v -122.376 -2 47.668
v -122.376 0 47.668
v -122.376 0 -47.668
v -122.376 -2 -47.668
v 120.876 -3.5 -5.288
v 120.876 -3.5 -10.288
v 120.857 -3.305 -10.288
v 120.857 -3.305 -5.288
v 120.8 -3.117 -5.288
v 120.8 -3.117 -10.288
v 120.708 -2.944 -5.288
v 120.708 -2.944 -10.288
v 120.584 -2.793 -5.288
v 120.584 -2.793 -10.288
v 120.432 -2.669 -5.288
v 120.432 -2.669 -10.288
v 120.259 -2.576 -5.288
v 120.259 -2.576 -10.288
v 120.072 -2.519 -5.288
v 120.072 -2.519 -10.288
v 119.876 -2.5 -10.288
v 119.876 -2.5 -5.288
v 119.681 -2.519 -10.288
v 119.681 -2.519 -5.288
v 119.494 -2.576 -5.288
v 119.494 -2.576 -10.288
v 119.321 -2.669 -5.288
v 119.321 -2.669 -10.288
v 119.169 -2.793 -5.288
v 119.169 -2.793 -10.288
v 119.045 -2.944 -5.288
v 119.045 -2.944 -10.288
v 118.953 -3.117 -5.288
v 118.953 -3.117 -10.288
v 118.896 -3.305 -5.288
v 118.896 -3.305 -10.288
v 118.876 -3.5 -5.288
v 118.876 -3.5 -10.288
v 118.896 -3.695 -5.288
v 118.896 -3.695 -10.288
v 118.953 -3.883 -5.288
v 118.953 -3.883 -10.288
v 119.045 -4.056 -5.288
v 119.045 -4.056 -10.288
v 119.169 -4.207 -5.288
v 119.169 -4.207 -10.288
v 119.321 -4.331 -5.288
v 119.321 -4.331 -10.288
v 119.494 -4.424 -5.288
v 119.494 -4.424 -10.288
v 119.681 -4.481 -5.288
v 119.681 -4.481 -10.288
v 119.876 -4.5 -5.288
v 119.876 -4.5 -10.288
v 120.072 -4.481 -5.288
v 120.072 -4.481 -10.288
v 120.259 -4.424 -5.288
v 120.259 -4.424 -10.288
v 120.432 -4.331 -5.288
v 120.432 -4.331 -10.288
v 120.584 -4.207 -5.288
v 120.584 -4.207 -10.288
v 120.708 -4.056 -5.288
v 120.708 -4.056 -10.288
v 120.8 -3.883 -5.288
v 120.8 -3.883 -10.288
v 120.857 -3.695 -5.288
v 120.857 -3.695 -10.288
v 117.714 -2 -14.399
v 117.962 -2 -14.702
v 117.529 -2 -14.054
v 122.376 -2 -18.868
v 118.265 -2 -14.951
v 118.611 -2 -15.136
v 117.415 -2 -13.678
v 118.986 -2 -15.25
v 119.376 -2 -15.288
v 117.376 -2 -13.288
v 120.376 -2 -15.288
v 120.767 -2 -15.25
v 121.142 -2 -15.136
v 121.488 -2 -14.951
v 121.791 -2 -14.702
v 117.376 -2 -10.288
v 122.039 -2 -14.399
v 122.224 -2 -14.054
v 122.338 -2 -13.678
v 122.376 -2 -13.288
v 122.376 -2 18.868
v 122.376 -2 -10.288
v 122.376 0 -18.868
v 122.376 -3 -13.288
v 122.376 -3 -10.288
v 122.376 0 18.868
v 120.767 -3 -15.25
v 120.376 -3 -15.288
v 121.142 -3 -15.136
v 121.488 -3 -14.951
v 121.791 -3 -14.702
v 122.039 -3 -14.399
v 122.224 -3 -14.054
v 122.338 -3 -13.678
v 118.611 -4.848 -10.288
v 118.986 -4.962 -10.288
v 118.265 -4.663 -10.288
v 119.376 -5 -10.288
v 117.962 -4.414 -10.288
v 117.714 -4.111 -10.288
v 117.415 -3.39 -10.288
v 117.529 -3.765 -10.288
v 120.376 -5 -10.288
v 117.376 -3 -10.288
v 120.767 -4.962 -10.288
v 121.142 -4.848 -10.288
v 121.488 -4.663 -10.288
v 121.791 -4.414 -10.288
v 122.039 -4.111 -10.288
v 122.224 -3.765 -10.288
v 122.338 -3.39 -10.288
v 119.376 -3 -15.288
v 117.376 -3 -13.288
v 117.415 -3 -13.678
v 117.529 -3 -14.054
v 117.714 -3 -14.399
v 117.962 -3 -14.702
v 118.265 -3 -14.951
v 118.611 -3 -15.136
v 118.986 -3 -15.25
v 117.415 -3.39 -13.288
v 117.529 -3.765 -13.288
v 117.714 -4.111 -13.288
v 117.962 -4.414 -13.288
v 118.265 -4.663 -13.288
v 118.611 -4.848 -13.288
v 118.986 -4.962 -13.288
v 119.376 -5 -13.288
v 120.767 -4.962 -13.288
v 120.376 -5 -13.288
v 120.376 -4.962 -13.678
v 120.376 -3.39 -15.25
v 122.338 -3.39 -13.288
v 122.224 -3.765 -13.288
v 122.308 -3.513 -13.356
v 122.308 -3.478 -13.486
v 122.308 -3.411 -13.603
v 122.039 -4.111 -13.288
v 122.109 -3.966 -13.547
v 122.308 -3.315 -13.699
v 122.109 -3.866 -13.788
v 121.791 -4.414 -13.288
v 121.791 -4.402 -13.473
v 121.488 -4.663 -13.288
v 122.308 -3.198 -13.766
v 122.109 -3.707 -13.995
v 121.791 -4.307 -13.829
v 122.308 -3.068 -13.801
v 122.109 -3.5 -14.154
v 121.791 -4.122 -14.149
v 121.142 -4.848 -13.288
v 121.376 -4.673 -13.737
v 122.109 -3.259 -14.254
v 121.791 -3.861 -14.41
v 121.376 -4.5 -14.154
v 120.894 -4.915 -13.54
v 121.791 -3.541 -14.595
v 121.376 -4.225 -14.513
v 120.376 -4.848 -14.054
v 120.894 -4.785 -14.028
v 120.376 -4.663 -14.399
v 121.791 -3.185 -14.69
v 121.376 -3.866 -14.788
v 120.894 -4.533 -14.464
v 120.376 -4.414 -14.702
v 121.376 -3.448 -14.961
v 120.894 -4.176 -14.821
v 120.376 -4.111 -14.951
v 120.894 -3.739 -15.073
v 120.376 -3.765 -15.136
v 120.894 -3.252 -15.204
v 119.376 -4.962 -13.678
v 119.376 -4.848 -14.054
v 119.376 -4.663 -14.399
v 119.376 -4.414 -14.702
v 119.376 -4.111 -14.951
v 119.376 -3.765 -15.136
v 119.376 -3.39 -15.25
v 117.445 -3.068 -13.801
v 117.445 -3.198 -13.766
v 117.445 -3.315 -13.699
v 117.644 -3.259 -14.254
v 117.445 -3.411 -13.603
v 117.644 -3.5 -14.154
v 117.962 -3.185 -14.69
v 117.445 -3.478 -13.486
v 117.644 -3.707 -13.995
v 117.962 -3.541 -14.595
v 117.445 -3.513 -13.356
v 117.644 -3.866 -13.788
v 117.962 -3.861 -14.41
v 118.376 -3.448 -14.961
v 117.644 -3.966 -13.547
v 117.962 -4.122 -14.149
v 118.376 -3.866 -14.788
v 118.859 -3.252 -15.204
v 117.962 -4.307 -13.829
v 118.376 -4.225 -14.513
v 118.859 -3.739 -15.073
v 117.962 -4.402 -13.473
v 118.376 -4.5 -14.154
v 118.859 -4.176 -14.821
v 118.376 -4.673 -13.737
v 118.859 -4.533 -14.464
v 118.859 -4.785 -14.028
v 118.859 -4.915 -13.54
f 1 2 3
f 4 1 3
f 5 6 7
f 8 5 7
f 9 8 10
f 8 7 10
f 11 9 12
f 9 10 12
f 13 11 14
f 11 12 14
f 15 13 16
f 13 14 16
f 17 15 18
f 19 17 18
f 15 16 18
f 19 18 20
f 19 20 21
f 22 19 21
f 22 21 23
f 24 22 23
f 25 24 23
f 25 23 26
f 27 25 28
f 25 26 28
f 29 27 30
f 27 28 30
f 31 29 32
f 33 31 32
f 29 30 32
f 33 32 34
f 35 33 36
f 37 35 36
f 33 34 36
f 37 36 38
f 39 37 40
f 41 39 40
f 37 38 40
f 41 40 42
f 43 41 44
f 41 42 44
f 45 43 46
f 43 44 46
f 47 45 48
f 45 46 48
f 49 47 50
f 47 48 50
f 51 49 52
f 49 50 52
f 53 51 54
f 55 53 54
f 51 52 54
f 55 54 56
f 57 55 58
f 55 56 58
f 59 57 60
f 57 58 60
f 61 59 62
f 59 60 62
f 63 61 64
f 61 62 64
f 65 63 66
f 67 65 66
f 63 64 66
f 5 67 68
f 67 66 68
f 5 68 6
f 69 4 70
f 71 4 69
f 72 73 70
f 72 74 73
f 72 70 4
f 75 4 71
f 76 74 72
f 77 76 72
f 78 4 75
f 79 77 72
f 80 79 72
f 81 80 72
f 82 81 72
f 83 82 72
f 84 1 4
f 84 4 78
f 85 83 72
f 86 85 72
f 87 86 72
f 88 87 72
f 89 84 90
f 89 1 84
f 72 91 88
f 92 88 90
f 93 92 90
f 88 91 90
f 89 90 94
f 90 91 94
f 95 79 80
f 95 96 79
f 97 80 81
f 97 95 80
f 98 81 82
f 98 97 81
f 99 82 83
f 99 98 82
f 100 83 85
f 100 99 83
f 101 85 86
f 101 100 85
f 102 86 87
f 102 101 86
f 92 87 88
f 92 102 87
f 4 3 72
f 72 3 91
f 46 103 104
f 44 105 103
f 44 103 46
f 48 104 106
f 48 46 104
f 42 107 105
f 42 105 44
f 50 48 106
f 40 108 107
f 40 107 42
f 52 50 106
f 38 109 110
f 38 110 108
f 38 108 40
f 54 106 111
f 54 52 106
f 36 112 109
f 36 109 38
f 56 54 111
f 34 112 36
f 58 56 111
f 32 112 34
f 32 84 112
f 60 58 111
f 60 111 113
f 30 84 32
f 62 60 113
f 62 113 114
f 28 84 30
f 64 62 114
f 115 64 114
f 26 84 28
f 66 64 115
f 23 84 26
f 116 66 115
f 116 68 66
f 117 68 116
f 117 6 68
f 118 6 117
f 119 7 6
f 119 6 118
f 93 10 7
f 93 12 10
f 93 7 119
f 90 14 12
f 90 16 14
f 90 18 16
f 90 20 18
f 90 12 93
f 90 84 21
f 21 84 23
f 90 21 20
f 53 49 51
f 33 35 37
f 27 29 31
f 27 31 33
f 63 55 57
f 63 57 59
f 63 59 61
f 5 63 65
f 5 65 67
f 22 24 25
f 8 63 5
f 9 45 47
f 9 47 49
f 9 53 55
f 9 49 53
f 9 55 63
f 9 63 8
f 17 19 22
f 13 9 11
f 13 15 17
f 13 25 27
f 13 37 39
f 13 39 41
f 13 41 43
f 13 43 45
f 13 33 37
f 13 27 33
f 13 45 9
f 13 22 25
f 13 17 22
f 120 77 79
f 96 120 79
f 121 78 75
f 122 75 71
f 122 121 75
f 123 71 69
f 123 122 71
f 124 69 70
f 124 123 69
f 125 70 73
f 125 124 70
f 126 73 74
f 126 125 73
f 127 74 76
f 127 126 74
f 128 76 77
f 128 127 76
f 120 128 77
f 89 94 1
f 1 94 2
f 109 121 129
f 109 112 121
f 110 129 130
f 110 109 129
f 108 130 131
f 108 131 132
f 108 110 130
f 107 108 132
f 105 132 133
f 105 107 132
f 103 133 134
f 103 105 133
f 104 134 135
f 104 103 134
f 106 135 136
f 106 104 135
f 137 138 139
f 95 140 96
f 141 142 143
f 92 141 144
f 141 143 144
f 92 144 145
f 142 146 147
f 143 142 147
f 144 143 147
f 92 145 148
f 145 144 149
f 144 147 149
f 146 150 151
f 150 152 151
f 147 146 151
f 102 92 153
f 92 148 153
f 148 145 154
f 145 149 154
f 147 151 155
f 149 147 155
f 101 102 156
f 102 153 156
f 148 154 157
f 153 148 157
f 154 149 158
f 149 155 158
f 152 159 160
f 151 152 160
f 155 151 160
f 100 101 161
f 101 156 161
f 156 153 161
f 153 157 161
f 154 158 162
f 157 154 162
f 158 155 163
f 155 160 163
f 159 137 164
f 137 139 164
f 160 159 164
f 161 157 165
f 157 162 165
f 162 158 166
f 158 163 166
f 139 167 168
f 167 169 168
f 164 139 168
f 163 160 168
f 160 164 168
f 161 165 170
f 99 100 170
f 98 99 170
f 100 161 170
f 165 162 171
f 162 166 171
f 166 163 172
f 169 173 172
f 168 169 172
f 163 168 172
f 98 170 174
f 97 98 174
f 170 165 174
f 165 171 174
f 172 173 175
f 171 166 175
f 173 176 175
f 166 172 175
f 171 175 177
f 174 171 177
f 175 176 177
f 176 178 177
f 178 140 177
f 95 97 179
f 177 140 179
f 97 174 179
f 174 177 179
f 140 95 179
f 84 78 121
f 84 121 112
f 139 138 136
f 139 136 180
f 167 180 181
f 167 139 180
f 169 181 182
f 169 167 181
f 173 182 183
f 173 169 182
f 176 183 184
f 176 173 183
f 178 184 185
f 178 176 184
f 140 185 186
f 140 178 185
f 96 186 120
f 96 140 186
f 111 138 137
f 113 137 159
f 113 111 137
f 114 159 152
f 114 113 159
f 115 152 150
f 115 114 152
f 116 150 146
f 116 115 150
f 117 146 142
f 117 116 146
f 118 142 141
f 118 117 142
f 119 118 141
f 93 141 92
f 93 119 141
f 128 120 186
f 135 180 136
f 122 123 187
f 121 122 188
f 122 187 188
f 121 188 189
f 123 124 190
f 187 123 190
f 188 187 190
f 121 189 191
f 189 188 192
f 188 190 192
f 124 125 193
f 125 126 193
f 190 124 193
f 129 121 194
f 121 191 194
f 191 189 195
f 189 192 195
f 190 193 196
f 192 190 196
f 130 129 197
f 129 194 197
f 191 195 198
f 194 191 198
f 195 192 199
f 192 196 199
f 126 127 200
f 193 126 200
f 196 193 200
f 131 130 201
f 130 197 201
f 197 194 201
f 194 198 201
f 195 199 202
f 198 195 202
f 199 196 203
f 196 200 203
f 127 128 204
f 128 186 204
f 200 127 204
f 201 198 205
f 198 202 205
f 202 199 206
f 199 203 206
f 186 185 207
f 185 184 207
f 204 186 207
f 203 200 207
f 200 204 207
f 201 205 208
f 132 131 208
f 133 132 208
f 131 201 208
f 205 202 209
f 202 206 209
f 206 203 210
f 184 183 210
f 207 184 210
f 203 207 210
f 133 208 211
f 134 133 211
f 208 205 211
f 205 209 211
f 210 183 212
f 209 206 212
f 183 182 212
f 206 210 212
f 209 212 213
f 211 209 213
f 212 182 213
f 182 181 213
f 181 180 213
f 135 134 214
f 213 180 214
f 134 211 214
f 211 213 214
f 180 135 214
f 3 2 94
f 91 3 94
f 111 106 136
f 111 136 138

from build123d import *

# Parameters (mm, degrees)
F1_DEPTH = 2
F0_W     = 5
F0_H     = 5
F2_DEPTH = 5
F3_R     = 1
F4_DEPTH = 5
F5_R     = 2


with BuildPart() as f1:
    # F0 (on Front) → F1 (new body)
    with BuildSketch(Plane.XZ):
        Polygon((122.376468, -10.288223), (122.376468, 18.867619), (-122.376468, 47.667619), (-122.376468, 27.667619), (-122.376468, 22.667619), (-122.376468, -47.667619), (122.376468, -18.867619), (122.376468, -15.288223), (117.376468, -15.288223), (117.376468, -10.288223), align=None)
    extrude(amount=F1_DEPTH)

    # F0 (on Front) → F2 (join)
    with BuildSketch(Plane.XZ):
        with Locations((119.876468, -12.788223)):
            Rectangle(F0_W, F0_H)
    extrude(amount=F2_DEPTH)

    # F3 (on face) → F4 (join)
    with BuildSketch(Plane.XY.offset(-10.288223)):
        with Locations((119.876468, -3.5)):
            Circle(F3_R)
    extrude(amount=F4_DEPTH)

    # F5
    f5_edges = [f1.edges().sort_by_distance(p)[0] for p in [
        (119.876468, -5, -15.288223),
        (122.376468, -5, -12.788223),
        (122.376468, -3.5, -15.288223),
        (117.376468, -3.5, -15.288223),
        (117.376468, -5, -12.788223),
    ]]
    fillet(f5_edges, radius=F5_R)


solid = f1.part
